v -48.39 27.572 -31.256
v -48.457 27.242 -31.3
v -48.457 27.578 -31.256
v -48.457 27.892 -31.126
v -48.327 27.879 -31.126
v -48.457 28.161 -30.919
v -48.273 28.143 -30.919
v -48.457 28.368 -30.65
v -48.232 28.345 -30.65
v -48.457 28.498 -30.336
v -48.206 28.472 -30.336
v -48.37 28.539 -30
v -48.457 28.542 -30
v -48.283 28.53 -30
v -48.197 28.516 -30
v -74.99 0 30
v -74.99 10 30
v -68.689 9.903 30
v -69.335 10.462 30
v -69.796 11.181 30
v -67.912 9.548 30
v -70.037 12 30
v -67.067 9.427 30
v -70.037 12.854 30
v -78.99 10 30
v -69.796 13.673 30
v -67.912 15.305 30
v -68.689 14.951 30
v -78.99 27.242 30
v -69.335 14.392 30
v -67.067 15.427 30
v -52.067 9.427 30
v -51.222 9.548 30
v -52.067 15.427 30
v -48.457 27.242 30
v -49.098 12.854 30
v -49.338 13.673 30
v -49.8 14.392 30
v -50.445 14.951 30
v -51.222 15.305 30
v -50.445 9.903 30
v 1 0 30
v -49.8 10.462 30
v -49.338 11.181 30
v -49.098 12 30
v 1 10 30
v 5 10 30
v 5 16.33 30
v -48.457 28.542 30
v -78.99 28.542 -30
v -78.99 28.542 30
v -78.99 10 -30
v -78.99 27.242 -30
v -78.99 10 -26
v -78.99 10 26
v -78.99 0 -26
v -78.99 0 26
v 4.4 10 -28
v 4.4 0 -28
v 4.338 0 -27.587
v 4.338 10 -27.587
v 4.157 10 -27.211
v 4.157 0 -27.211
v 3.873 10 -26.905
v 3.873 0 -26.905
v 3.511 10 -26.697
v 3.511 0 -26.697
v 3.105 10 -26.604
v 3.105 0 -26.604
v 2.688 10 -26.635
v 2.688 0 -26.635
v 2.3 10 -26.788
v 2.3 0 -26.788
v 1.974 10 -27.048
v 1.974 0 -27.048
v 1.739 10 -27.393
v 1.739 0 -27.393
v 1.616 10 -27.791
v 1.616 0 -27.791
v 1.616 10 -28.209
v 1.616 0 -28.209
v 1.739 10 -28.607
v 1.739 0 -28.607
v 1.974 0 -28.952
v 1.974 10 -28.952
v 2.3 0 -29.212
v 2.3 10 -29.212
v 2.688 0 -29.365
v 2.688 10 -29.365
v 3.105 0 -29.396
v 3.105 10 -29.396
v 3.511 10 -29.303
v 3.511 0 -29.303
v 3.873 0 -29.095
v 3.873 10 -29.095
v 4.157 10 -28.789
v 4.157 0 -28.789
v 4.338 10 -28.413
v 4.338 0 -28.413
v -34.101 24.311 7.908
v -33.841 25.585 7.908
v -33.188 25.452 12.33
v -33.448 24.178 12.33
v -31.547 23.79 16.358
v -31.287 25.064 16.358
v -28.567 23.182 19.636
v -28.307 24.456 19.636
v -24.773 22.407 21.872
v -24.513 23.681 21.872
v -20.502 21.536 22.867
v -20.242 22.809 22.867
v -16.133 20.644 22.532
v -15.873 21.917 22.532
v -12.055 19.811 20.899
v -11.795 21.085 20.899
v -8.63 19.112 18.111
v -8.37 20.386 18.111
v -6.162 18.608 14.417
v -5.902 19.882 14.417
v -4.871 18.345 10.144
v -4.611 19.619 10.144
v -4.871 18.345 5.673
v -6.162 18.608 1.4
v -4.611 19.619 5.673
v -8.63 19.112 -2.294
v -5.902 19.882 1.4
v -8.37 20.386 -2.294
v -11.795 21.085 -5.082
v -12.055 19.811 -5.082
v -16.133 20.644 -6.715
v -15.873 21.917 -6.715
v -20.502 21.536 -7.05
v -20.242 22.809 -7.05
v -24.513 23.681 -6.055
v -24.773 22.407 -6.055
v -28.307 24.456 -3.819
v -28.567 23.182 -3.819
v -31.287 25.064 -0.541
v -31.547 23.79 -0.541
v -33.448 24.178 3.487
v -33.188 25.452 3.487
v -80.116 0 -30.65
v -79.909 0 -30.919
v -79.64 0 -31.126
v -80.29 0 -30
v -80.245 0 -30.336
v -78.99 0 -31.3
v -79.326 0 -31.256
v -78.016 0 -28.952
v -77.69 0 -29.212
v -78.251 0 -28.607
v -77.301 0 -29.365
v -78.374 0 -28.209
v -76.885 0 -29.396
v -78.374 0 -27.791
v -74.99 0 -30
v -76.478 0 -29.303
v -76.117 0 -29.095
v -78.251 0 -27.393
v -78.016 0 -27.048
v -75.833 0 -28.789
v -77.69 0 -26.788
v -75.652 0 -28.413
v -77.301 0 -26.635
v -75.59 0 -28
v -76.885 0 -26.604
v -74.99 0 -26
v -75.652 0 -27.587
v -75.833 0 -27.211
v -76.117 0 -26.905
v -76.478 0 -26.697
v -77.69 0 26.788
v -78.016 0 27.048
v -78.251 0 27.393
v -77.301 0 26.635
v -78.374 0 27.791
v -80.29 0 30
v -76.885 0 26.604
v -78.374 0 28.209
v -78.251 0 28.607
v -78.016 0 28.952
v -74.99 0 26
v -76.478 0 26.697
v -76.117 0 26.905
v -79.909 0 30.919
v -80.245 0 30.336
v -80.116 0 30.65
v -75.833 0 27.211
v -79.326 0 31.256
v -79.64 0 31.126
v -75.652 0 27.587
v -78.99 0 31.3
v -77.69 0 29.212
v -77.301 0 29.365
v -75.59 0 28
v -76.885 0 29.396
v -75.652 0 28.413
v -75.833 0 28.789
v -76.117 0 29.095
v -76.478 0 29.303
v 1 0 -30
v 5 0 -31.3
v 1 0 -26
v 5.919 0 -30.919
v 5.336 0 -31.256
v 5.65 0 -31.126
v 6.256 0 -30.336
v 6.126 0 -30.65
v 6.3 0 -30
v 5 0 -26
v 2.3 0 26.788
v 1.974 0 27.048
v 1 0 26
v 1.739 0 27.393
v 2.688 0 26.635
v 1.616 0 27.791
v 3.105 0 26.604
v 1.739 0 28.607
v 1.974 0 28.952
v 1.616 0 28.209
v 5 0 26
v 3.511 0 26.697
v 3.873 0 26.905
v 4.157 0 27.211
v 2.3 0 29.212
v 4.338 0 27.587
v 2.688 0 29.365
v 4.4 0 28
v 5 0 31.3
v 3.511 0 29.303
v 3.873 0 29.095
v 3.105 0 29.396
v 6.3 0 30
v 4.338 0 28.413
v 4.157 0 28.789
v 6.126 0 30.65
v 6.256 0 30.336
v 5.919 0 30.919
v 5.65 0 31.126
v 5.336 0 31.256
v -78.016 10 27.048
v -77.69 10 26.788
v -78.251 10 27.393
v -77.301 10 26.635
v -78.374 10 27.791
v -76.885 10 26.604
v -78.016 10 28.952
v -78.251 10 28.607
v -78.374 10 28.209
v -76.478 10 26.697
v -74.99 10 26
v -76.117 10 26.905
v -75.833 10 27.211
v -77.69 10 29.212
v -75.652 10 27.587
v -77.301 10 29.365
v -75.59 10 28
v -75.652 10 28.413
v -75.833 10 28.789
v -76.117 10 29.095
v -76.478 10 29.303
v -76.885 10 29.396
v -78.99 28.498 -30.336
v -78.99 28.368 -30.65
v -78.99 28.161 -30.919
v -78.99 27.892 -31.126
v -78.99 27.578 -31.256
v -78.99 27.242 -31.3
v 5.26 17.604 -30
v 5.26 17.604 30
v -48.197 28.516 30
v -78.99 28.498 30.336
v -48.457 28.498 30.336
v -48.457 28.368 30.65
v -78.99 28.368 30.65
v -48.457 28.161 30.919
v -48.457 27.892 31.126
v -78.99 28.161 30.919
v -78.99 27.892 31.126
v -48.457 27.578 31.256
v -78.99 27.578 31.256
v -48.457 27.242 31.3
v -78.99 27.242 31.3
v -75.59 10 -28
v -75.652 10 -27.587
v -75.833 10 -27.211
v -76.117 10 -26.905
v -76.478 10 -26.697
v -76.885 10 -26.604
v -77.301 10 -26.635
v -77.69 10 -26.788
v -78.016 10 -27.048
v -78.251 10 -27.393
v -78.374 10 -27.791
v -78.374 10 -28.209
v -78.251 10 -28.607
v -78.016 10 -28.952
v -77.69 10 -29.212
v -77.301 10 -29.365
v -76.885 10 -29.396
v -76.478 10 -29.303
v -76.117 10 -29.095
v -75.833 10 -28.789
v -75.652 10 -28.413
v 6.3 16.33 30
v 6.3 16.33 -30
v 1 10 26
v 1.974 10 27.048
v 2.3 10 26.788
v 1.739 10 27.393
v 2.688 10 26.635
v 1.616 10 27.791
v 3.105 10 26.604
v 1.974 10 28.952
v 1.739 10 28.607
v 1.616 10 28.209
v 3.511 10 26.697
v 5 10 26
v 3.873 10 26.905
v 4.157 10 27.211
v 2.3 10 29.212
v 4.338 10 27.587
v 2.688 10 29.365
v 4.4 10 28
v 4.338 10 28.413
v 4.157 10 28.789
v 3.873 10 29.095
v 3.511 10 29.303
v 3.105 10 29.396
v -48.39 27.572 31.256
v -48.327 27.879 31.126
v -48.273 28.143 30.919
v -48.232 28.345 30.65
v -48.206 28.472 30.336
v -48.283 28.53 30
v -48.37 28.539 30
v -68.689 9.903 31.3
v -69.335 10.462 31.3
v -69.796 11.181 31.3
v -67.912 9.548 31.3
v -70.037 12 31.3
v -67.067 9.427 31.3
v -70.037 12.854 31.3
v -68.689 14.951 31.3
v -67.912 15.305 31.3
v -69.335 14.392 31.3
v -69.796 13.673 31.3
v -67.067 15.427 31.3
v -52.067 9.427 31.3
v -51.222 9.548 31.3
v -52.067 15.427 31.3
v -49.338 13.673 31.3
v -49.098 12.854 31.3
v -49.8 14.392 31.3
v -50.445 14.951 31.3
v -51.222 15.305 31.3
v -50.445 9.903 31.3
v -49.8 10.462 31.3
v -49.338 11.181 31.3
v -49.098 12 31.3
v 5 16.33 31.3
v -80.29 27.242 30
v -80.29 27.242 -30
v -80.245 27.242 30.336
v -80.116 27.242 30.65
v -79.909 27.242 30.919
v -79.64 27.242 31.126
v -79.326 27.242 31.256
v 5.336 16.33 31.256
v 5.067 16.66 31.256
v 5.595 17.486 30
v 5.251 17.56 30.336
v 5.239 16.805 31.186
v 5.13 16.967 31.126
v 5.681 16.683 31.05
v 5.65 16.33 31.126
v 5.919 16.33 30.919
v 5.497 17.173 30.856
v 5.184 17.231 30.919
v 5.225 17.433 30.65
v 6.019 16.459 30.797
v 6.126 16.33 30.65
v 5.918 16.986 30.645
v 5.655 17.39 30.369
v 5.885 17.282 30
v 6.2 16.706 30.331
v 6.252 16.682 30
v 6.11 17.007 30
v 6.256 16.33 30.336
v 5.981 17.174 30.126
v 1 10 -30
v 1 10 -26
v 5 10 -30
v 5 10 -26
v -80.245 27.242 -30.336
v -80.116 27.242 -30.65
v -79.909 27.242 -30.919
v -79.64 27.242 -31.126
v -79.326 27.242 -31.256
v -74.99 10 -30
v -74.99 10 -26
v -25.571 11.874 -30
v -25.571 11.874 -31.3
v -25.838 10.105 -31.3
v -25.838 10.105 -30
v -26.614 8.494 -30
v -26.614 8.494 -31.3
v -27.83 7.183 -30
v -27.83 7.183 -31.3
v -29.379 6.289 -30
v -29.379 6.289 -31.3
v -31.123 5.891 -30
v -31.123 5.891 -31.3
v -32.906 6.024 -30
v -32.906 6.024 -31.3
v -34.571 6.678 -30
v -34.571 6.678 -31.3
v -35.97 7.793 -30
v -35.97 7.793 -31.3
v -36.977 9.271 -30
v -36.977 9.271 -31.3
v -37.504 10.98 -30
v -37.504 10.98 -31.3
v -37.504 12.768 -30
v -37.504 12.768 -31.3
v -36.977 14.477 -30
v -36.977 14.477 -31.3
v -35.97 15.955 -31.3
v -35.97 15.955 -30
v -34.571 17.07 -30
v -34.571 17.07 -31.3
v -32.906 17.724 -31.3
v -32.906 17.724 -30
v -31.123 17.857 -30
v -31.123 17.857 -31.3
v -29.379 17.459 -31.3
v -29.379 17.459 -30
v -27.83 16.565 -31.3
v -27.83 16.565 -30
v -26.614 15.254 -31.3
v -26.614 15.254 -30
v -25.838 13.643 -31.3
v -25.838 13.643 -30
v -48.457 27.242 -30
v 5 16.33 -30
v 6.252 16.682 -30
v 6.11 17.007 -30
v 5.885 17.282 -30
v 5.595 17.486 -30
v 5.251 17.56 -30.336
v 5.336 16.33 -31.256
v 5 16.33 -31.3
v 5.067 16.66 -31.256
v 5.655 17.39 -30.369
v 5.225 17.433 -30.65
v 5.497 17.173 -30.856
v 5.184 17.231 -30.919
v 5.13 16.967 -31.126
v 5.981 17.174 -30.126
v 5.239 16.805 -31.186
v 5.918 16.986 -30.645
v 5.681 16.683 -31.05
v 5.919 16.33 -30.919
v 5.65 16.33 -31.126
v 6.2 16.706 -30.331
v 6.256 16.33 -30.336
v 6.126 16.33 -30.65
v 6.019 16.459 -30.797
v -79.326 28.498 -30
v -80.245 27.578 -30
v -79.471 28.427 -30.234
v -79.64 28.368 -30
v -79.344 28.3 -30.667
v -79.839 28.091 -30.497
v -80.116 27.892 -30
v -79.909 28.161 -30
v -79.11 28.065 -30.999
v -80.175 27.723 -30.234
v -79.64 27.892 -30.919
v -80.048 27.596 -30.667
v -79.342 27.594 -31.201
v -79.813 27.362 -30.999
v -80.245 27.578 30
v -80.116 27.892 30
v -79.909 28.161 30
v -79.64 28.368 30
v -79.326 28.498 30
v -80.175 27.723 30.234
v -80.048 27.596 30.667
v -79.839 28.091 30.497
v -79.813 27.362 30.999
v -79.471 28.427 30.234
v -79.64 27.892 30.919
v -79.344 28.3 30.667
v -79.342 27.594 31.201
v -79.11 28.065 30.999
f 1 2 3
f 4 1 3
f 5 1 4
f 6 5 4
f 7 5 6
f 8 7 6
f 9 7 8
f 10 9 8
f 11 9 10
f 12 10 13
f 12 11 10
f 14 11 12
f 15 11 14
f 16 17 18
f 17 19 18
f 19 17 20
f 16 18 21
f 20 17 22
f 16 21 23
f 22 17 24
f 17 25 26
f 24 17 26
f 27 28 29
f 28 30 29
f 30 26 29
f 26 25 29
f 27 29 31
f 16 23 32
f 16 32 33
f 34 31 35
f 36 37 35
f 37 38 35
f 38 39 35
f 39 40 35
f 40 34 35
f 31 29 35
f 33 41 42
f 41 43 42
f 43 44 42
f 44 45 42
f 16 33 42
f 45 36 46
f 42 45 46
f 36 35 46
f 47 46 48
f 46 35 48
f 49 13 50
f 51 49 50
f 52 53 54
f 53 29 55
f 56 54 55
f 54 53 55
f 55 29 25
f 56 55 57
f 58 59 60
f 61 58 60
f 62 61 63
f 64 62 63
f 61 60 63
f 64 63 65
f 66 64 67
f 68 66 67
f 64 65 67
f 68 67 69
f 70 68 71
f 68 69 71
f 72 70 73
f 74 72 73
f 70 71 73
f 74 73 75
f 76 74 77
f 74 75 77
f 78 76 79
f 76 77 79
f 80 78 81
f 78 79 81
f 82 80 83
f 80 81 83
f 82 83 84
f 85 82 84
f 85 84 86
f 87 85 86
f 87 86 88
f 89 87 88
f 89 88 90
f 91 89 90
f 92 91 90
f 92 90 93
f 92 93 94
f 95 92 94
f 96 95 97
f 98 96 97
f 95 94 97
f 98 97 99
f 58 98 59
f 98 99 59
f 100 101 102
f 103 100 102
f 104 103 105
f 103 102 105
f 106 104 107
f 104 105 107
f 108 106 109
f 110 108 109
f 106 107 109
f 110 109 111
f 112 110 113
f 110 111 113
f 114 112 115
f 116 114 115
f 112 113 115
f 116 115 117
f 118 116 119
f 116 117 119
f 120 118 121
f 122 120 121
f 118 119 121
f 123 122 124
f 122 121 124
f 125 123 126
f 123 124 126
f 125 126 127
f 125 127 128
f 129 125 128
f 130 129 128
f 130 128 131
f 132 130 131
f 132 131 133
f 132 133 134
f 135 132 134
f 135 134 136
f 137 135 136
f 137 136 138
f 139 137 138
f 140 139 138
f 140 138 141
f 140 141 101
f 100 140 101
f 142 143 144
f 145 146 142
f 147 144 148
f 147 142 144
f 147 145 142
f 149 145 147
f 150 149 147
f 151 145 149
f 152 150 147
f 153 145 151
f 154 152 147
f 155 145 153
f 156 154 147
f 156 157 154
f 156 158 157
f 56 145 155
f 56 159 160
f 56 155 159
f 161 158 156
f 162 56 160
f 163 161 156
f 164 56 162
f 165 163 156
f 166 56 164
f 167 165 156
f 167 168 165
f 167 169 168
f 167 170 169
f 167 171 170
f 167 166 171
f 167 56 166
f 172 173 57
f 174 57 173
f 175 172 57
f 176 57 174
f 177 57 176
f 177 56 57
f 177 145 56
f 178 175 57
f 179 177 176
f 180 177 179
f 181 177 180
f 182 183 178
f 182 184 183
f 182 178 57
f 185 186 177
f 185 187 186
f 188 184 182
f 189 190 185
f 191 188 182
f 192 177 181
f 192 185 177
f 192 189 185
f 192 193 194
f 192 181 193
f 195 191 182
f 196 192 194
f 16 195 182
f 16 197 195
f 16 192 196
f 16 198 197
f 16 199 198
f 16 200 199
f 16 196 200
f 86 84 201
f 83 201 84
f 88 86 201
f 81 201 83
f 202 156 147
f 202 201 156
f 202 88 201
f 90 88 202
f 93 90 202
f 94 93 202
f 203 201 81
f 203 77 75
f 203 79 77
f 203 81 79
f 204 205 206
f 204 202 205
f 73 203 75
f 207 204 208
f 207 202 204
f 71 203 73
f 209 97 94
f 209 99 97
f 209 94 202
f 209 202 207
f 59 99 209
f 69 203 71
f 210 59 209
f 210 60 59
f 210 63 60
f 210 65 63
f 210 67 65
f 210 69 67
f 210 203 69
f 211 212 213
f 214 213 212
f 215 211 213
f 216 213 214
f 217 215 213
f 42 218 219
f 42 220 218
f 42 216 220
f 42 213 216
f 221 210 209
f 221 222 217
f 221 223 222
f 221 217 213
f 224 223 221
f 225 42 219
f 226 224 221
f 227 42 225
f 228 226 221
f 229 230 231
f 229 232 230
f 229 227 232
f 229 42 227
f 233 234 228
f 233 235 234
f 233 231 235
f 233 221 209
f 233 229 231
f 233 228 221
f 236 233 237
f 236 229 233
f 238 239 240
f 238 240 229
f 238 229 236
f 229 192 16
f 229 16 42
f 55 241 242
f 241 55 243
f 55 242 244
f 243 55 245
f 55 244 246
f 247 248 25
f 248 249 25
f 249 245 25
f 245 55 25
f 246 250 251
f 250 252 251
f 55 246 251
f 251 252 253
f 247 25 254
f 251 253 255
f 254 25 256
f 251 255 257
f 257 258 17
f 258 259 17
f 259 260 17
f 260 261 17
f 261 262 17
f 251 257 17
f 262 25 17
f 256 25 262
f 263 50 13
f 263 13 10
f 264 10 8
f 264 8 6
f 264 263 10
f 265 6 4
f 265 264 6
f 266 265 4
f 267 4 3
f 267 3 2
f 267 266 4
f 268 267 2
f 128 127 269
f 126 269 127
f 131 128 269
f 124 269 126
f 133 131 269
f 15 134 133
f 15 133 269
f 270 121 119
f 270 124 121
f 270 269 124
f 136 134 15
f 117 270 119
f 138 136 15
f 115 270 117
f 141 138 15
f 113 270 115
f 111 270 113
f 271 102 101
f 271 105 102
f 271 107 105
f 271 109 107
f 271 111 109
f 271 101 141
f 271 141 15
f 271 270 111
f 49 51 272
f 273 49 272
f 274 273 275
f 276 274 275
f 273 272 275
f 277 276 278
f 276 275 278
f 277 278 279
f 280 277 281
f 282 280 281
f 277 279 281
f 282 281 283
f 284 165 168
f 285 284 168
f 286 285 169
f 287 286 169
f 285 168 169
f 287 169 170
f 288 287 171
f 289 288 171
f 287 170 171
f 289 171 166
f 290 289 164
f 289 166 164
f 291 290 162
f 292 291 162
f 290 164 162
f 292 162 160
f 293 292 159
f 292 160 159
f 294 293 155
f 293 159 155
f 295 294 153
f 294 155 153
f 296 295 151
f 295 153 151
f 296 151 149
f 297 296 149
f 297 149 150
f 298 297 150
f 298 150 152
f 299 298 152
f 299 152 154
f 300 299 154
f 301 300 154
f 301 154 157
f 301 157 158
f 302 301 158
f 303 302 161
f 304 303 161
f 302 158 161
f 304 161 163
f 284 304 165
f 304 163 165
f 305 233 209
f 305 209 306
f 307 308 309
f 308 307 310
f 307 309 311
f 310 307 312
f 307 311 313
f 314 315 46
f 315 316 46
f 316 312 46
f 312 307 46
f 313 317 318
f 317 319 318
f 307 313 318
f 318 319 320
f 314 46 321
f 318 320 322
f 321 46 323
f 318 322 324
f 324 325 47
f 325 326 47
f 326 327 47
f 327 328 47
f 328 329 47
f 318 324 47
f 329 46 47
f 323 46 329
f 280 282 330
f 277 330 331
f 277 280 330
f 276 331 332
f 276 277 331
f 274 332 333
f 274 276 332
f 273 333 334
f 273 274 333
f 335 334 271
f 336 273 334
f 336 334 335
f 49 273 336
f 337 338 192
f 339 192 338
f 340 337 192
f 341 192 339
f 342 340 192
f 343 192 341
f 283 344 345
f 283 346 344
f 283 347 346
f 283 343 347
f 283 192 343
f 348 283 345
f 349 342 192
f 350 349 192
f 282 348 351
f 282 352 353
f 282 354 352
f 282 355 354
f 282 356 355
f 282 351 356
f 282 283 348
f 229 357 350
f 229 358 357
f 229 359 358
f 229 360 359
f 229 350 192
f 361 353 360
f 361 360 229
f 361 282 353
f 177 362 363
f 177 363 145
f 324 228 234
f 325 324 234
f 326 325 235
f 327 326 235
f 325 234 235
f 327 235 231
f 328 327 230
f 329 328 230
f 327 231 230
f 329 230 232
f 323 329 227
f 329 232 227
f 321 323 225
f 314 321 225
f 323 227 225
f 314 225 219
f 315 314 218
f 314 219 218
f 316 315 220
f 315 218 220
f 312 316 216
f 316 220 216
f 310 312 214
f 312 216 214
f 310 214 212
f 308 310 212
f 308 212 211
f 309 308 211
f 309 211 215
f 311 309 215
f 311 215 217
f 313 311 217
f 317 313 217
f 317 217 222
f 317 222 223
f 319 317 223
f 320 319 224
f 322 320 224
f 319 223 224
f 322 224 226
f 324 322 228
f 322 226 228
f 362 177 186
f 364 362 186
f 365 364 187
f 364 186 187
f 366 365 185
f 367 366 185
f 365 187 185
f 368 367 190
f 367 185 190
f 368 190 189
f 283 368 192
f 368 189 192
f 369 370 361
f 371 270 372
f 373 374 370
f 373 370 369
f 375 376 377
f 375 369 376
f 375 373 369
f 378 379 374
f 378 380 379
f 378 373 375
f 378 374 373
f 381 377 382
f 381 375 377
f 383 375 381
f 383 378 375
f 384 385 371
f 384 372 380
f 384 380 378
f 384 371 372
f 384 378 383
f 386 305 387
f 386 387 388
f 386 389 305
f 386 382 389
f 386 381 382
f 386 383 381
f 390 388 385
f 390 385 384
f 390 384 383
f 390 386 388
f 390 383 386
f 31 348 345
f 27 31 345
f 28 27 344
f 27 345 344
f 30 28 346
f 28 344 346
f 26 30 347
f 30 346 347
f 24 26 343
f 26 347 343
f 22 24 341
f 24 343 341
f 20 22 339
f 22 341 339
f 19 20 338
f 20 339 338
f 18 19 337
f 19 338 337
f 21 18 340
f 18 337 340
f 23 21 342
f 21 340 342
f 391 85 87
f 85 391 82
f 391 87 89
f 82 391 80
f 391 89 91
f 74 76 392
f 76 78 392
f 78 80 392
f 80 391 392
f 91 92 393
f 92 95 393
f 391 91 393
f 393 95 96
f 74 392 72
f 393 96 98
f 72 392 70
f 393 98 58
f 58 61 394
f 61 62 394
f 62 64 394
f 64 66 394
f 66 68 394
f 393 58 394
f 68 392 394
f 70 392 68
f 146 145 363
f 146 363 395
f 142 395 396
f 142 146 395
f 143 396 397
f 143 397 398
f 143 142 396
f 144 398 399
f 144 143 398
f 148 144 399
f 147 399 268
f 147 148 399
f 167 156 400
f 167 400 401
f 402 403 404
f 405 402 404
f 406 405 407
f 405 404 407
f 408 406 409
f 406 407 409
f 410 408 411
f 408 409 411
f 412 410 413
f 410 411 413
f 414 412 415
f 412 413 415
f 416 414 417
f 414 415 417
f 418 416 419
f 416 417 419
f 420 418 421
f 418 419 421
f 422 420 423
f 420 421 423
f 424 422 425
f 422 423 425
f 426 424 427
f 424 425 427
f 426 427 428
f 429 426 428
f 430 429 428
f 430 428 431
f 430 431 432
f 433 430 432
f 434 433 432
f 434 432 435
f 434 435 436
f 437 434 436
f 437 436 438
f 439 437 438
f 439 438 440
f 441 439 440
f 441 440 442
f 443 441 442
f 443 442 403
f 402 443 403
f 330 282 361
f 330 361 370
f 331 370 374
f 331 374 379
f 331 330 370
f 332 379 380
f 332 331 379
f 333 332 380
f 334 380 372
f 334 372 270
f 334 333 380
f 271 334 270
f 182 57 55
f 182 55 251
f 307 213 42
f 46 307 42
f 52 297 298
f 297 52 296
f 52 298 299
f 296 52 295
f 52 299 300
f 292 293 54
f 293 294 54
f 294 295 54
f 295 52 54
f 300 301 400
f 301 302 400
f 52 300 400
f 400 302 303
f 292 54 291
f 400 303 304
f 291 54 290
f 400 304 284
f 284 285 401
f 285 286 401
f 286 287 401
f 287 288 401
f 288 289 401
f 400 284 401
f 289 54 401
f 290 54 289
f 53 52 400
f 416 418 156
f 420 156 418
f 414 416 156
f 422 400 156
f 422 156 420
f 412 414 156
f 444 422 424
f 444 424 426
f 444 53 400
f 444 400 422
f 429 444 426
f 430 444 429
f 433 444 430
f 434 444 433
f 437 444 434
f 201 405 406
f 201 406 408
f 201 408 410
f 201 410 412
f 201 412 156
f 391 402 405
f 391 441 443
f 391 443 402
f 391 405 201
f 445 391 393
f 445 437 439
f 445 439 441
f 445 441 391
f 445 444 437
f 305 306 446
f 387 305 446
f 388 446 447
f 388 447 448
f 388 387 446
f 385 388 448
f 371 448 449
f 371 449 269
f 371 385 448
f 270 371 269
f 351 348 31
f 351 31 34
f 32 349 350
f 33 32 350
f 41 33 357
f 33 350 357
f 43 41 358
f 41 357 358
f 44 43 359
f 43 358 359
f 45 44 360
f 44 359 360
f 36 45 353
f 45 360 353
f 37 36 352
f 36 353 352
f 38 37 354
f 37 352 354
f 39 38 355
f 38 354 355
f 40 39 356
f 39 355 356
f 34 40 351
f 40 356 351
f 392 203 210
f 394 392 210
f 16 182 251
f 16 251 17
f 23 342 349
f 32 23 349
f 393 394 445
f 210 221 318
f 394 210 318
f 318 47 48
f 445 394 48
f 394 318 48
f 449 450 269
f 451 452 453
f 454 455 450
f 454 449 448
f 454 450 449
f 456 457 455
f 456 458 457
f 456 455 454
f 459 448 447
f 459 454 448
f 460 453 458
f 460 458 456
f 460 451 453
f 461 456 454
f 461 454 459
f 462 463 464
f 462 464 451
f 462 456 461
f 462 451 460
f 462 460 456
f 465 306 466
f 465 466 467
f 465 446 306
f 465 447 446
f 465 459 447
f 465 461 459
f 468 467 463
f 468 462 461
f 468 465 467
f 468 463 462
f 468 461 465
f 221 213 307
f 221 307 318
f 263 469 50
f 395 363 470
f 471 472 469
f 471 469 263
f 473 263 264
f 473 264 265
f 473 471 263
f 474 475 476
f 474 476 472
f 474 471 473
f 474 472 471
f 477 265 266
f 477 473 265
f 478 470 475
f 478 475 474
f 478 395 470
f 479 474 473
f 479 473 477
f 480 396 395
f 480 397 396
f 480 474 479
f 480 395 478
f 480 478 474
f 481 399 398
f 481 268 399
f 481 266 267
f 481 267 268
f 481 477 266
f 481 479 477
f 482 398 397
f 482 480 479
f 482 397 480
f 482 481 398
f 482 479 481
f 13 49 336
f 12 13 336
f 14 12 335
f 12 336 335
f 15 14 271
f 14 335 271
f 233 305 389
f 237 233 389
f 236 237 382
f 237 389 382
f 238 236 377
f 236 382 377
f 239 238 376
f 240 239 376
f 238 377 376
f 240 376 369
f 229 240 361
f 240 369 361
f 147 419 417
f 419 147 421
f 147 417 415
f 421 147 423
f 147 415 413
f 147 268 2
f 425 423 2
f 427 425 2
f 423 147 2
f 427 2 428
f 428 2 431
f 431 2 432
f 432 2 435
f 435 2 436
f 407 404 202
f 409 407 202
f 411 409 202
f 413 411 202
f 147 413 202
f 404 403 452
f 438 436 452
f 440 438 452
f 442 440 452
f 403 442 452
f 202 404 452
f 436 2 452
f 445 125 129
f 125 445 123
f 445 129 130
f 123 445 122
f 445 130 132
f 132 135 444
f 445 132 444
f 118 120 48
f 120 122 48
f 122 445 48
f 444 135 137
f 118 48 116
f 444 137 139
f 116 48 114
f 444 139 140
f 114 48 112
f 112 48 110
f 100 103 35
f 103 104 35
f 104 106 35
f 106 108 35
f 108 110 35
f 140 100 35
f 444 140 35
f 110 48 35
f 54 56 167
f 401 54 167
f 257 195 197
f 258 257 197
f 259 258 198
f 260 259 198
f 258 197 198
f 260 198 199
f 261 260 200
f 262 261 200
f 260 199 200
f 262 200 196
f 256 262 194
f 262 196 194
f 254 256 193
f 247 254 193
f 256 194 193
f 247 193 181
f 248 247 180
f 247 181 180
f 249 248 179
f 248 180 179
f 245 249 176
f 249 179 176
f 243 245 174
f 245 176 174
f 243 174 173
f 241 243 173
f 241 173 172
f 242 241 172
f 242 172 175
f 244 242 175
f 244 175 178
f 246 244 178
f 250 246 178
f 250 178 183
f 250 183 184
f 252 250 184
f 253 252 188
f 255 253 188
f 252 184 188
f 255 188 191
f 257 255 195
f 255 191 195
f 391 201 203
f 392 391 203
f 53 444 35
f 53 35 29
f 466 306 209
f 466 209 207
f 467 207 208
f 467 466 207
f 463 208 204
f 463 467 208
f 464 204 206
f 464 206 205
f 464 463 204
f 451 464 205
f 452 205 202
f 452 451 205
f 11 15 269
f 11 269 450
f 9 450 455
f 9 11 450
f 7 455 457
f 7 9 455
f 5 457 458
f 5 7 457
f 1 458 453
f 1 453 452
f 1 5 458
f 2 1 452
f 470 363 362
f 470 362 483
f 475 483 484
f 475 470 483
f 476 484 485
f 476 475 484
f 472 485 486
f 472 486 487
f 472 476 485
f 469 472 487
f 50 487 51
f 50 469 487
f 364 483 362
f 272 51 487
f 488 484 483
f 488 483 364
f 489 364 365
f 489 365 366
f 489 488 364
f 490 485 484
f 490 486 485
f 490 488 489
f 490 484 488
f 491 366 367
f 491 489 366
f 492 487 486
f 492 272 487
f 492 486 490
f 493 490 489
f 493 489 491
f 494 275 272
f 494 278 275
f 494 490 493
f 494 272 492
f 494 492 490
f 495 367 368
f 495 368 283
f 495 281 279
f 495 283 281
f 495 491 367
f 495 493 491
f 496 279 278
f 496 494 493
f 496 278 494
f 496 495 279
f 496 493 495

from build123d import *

# Parameters (mm, degrees)
PAD004_DEPTH    = 30
THICKNESS_T     = 1.3
SKETCH008_R     = 15
POCKET002_DEPTH = 5
SKETCH010_W     = 4
SKETCH010_H     = 4
SKETCH010_R     = 1.4
PAD006_DEPTH    = 10
POCKET003_DEPTH = 5
SKETCH013_R     = 6
POCKET004_DEPTH = 5


with BuildPart() as part:
    # CopySketch007 → Pad004 (new body, symmetric)
    with BuildSketch(Plane.XY):
        Polygon((5, 0), (5, 16.3299316186), (-48.4572350855, 27.2418440368), (-78.9897948557, 27.2418440368), (-78.9897948557, 0), align=None)
    extrude(amount=PAD004_DEPTH, both=True)

    # Thickness
    thickness_openings = [part.faces().sort_by_distance(p)[0] for p in [
        (-36.994897, 0, 0),
    ]]
    offset(amount=THICKNESS_T, openings=thickness_openings)

    # Sketch008 (on Face24 of Thickness) → Pocket002 (cut)
    with BuildSketch(Plane(origin=(3.66, 17.9302649172, 0), x_dir=(-0.9797958971, 0.2, 0), z_dir=(0.2, 0.9797958971, 0))):
        with Locations((23.2739585094, 7.9084926401)):
            Circle(SKETCH008_R)
    extrude(amount=-POCKET002_DEPTH, mode=Mode.SUBTRACT)

    # Sketch010 (on Face17 of Pocket002) → Pad006 (join)
    with BuildSketch(Plane.XZ):
        with Locations((-76.9897948557, 28)):
            Rectangle(SKETCH010_W, SKETCH010_H)
        with Locations((-76.9897948557, 28)):
            Circle(SKETCH010_R, mode=Mode.SUBTRACT)
        with Locations((-76.9897948557, -28)):
            Rectangle(SKETCH010_W, SKETCH010_H)
        with Locations((-76.9897948557, -28)):
            Circle(SKETCH010_R, mode=Mode.SUBTRACT)
        with Locations((3, -28)):
            Rectangle(SKETCH010_W, SKETCH010_H)
        with Locations((3, -28)):
            Circle(SKETCH010_R, mode=Mode.SUBTRACT)
        with Locations((3, 28)):
            Rectangle(SKETCH010_W, SKETCH010_H)
        with Locations((3, 28)):
            Circle(SKETCH010_R, mode=Mode.SUBTRACT)
    extrude(amount=-PAD006_DEPTH)

    # Sketch012 (on Face8 of Pad006) → Pocket003 (cut)
    with BuildSketch(Plane.XY.offset(31.3)):
        with BuildLine():
            ThreePointArc((-67.0672858986, 15.4269435951), (-70.0672858986, 12.4269435951), (-67.0672858986, 9.4269435951))
            Line((-67.0672858986, 9.4269435951), (-52.0672858986, 9.4269435951))
            ThreePointArc((-52.0672858986, 9.4269435951), (-49.0672858986, 12.4269435951), (-52.0672858986, 15.4269435951))
            Line((-67.0672858986, 15.4269435951), (-52.0672858986, 15.4269435951))
        make_face()
    extrude(amount=-POCKET003_DEPTH, mode=Mode.SUBTRACT)

    # Sketch013 (on Face25 of Pocket003) → Pocket004 (cut)
    with BuildSketch(Plane(origin=(0, 0, -31.3), x_dir=(1, 0, 0), z_dir=(0, 0, -1))):
        with Locations((-31.571347, -11.873986)):
            Circle(SKETCH013_R)
    extrude(amount=-POCKET004_DEPTH, mode=Mode.SUBTRACT)


solid = part.part
